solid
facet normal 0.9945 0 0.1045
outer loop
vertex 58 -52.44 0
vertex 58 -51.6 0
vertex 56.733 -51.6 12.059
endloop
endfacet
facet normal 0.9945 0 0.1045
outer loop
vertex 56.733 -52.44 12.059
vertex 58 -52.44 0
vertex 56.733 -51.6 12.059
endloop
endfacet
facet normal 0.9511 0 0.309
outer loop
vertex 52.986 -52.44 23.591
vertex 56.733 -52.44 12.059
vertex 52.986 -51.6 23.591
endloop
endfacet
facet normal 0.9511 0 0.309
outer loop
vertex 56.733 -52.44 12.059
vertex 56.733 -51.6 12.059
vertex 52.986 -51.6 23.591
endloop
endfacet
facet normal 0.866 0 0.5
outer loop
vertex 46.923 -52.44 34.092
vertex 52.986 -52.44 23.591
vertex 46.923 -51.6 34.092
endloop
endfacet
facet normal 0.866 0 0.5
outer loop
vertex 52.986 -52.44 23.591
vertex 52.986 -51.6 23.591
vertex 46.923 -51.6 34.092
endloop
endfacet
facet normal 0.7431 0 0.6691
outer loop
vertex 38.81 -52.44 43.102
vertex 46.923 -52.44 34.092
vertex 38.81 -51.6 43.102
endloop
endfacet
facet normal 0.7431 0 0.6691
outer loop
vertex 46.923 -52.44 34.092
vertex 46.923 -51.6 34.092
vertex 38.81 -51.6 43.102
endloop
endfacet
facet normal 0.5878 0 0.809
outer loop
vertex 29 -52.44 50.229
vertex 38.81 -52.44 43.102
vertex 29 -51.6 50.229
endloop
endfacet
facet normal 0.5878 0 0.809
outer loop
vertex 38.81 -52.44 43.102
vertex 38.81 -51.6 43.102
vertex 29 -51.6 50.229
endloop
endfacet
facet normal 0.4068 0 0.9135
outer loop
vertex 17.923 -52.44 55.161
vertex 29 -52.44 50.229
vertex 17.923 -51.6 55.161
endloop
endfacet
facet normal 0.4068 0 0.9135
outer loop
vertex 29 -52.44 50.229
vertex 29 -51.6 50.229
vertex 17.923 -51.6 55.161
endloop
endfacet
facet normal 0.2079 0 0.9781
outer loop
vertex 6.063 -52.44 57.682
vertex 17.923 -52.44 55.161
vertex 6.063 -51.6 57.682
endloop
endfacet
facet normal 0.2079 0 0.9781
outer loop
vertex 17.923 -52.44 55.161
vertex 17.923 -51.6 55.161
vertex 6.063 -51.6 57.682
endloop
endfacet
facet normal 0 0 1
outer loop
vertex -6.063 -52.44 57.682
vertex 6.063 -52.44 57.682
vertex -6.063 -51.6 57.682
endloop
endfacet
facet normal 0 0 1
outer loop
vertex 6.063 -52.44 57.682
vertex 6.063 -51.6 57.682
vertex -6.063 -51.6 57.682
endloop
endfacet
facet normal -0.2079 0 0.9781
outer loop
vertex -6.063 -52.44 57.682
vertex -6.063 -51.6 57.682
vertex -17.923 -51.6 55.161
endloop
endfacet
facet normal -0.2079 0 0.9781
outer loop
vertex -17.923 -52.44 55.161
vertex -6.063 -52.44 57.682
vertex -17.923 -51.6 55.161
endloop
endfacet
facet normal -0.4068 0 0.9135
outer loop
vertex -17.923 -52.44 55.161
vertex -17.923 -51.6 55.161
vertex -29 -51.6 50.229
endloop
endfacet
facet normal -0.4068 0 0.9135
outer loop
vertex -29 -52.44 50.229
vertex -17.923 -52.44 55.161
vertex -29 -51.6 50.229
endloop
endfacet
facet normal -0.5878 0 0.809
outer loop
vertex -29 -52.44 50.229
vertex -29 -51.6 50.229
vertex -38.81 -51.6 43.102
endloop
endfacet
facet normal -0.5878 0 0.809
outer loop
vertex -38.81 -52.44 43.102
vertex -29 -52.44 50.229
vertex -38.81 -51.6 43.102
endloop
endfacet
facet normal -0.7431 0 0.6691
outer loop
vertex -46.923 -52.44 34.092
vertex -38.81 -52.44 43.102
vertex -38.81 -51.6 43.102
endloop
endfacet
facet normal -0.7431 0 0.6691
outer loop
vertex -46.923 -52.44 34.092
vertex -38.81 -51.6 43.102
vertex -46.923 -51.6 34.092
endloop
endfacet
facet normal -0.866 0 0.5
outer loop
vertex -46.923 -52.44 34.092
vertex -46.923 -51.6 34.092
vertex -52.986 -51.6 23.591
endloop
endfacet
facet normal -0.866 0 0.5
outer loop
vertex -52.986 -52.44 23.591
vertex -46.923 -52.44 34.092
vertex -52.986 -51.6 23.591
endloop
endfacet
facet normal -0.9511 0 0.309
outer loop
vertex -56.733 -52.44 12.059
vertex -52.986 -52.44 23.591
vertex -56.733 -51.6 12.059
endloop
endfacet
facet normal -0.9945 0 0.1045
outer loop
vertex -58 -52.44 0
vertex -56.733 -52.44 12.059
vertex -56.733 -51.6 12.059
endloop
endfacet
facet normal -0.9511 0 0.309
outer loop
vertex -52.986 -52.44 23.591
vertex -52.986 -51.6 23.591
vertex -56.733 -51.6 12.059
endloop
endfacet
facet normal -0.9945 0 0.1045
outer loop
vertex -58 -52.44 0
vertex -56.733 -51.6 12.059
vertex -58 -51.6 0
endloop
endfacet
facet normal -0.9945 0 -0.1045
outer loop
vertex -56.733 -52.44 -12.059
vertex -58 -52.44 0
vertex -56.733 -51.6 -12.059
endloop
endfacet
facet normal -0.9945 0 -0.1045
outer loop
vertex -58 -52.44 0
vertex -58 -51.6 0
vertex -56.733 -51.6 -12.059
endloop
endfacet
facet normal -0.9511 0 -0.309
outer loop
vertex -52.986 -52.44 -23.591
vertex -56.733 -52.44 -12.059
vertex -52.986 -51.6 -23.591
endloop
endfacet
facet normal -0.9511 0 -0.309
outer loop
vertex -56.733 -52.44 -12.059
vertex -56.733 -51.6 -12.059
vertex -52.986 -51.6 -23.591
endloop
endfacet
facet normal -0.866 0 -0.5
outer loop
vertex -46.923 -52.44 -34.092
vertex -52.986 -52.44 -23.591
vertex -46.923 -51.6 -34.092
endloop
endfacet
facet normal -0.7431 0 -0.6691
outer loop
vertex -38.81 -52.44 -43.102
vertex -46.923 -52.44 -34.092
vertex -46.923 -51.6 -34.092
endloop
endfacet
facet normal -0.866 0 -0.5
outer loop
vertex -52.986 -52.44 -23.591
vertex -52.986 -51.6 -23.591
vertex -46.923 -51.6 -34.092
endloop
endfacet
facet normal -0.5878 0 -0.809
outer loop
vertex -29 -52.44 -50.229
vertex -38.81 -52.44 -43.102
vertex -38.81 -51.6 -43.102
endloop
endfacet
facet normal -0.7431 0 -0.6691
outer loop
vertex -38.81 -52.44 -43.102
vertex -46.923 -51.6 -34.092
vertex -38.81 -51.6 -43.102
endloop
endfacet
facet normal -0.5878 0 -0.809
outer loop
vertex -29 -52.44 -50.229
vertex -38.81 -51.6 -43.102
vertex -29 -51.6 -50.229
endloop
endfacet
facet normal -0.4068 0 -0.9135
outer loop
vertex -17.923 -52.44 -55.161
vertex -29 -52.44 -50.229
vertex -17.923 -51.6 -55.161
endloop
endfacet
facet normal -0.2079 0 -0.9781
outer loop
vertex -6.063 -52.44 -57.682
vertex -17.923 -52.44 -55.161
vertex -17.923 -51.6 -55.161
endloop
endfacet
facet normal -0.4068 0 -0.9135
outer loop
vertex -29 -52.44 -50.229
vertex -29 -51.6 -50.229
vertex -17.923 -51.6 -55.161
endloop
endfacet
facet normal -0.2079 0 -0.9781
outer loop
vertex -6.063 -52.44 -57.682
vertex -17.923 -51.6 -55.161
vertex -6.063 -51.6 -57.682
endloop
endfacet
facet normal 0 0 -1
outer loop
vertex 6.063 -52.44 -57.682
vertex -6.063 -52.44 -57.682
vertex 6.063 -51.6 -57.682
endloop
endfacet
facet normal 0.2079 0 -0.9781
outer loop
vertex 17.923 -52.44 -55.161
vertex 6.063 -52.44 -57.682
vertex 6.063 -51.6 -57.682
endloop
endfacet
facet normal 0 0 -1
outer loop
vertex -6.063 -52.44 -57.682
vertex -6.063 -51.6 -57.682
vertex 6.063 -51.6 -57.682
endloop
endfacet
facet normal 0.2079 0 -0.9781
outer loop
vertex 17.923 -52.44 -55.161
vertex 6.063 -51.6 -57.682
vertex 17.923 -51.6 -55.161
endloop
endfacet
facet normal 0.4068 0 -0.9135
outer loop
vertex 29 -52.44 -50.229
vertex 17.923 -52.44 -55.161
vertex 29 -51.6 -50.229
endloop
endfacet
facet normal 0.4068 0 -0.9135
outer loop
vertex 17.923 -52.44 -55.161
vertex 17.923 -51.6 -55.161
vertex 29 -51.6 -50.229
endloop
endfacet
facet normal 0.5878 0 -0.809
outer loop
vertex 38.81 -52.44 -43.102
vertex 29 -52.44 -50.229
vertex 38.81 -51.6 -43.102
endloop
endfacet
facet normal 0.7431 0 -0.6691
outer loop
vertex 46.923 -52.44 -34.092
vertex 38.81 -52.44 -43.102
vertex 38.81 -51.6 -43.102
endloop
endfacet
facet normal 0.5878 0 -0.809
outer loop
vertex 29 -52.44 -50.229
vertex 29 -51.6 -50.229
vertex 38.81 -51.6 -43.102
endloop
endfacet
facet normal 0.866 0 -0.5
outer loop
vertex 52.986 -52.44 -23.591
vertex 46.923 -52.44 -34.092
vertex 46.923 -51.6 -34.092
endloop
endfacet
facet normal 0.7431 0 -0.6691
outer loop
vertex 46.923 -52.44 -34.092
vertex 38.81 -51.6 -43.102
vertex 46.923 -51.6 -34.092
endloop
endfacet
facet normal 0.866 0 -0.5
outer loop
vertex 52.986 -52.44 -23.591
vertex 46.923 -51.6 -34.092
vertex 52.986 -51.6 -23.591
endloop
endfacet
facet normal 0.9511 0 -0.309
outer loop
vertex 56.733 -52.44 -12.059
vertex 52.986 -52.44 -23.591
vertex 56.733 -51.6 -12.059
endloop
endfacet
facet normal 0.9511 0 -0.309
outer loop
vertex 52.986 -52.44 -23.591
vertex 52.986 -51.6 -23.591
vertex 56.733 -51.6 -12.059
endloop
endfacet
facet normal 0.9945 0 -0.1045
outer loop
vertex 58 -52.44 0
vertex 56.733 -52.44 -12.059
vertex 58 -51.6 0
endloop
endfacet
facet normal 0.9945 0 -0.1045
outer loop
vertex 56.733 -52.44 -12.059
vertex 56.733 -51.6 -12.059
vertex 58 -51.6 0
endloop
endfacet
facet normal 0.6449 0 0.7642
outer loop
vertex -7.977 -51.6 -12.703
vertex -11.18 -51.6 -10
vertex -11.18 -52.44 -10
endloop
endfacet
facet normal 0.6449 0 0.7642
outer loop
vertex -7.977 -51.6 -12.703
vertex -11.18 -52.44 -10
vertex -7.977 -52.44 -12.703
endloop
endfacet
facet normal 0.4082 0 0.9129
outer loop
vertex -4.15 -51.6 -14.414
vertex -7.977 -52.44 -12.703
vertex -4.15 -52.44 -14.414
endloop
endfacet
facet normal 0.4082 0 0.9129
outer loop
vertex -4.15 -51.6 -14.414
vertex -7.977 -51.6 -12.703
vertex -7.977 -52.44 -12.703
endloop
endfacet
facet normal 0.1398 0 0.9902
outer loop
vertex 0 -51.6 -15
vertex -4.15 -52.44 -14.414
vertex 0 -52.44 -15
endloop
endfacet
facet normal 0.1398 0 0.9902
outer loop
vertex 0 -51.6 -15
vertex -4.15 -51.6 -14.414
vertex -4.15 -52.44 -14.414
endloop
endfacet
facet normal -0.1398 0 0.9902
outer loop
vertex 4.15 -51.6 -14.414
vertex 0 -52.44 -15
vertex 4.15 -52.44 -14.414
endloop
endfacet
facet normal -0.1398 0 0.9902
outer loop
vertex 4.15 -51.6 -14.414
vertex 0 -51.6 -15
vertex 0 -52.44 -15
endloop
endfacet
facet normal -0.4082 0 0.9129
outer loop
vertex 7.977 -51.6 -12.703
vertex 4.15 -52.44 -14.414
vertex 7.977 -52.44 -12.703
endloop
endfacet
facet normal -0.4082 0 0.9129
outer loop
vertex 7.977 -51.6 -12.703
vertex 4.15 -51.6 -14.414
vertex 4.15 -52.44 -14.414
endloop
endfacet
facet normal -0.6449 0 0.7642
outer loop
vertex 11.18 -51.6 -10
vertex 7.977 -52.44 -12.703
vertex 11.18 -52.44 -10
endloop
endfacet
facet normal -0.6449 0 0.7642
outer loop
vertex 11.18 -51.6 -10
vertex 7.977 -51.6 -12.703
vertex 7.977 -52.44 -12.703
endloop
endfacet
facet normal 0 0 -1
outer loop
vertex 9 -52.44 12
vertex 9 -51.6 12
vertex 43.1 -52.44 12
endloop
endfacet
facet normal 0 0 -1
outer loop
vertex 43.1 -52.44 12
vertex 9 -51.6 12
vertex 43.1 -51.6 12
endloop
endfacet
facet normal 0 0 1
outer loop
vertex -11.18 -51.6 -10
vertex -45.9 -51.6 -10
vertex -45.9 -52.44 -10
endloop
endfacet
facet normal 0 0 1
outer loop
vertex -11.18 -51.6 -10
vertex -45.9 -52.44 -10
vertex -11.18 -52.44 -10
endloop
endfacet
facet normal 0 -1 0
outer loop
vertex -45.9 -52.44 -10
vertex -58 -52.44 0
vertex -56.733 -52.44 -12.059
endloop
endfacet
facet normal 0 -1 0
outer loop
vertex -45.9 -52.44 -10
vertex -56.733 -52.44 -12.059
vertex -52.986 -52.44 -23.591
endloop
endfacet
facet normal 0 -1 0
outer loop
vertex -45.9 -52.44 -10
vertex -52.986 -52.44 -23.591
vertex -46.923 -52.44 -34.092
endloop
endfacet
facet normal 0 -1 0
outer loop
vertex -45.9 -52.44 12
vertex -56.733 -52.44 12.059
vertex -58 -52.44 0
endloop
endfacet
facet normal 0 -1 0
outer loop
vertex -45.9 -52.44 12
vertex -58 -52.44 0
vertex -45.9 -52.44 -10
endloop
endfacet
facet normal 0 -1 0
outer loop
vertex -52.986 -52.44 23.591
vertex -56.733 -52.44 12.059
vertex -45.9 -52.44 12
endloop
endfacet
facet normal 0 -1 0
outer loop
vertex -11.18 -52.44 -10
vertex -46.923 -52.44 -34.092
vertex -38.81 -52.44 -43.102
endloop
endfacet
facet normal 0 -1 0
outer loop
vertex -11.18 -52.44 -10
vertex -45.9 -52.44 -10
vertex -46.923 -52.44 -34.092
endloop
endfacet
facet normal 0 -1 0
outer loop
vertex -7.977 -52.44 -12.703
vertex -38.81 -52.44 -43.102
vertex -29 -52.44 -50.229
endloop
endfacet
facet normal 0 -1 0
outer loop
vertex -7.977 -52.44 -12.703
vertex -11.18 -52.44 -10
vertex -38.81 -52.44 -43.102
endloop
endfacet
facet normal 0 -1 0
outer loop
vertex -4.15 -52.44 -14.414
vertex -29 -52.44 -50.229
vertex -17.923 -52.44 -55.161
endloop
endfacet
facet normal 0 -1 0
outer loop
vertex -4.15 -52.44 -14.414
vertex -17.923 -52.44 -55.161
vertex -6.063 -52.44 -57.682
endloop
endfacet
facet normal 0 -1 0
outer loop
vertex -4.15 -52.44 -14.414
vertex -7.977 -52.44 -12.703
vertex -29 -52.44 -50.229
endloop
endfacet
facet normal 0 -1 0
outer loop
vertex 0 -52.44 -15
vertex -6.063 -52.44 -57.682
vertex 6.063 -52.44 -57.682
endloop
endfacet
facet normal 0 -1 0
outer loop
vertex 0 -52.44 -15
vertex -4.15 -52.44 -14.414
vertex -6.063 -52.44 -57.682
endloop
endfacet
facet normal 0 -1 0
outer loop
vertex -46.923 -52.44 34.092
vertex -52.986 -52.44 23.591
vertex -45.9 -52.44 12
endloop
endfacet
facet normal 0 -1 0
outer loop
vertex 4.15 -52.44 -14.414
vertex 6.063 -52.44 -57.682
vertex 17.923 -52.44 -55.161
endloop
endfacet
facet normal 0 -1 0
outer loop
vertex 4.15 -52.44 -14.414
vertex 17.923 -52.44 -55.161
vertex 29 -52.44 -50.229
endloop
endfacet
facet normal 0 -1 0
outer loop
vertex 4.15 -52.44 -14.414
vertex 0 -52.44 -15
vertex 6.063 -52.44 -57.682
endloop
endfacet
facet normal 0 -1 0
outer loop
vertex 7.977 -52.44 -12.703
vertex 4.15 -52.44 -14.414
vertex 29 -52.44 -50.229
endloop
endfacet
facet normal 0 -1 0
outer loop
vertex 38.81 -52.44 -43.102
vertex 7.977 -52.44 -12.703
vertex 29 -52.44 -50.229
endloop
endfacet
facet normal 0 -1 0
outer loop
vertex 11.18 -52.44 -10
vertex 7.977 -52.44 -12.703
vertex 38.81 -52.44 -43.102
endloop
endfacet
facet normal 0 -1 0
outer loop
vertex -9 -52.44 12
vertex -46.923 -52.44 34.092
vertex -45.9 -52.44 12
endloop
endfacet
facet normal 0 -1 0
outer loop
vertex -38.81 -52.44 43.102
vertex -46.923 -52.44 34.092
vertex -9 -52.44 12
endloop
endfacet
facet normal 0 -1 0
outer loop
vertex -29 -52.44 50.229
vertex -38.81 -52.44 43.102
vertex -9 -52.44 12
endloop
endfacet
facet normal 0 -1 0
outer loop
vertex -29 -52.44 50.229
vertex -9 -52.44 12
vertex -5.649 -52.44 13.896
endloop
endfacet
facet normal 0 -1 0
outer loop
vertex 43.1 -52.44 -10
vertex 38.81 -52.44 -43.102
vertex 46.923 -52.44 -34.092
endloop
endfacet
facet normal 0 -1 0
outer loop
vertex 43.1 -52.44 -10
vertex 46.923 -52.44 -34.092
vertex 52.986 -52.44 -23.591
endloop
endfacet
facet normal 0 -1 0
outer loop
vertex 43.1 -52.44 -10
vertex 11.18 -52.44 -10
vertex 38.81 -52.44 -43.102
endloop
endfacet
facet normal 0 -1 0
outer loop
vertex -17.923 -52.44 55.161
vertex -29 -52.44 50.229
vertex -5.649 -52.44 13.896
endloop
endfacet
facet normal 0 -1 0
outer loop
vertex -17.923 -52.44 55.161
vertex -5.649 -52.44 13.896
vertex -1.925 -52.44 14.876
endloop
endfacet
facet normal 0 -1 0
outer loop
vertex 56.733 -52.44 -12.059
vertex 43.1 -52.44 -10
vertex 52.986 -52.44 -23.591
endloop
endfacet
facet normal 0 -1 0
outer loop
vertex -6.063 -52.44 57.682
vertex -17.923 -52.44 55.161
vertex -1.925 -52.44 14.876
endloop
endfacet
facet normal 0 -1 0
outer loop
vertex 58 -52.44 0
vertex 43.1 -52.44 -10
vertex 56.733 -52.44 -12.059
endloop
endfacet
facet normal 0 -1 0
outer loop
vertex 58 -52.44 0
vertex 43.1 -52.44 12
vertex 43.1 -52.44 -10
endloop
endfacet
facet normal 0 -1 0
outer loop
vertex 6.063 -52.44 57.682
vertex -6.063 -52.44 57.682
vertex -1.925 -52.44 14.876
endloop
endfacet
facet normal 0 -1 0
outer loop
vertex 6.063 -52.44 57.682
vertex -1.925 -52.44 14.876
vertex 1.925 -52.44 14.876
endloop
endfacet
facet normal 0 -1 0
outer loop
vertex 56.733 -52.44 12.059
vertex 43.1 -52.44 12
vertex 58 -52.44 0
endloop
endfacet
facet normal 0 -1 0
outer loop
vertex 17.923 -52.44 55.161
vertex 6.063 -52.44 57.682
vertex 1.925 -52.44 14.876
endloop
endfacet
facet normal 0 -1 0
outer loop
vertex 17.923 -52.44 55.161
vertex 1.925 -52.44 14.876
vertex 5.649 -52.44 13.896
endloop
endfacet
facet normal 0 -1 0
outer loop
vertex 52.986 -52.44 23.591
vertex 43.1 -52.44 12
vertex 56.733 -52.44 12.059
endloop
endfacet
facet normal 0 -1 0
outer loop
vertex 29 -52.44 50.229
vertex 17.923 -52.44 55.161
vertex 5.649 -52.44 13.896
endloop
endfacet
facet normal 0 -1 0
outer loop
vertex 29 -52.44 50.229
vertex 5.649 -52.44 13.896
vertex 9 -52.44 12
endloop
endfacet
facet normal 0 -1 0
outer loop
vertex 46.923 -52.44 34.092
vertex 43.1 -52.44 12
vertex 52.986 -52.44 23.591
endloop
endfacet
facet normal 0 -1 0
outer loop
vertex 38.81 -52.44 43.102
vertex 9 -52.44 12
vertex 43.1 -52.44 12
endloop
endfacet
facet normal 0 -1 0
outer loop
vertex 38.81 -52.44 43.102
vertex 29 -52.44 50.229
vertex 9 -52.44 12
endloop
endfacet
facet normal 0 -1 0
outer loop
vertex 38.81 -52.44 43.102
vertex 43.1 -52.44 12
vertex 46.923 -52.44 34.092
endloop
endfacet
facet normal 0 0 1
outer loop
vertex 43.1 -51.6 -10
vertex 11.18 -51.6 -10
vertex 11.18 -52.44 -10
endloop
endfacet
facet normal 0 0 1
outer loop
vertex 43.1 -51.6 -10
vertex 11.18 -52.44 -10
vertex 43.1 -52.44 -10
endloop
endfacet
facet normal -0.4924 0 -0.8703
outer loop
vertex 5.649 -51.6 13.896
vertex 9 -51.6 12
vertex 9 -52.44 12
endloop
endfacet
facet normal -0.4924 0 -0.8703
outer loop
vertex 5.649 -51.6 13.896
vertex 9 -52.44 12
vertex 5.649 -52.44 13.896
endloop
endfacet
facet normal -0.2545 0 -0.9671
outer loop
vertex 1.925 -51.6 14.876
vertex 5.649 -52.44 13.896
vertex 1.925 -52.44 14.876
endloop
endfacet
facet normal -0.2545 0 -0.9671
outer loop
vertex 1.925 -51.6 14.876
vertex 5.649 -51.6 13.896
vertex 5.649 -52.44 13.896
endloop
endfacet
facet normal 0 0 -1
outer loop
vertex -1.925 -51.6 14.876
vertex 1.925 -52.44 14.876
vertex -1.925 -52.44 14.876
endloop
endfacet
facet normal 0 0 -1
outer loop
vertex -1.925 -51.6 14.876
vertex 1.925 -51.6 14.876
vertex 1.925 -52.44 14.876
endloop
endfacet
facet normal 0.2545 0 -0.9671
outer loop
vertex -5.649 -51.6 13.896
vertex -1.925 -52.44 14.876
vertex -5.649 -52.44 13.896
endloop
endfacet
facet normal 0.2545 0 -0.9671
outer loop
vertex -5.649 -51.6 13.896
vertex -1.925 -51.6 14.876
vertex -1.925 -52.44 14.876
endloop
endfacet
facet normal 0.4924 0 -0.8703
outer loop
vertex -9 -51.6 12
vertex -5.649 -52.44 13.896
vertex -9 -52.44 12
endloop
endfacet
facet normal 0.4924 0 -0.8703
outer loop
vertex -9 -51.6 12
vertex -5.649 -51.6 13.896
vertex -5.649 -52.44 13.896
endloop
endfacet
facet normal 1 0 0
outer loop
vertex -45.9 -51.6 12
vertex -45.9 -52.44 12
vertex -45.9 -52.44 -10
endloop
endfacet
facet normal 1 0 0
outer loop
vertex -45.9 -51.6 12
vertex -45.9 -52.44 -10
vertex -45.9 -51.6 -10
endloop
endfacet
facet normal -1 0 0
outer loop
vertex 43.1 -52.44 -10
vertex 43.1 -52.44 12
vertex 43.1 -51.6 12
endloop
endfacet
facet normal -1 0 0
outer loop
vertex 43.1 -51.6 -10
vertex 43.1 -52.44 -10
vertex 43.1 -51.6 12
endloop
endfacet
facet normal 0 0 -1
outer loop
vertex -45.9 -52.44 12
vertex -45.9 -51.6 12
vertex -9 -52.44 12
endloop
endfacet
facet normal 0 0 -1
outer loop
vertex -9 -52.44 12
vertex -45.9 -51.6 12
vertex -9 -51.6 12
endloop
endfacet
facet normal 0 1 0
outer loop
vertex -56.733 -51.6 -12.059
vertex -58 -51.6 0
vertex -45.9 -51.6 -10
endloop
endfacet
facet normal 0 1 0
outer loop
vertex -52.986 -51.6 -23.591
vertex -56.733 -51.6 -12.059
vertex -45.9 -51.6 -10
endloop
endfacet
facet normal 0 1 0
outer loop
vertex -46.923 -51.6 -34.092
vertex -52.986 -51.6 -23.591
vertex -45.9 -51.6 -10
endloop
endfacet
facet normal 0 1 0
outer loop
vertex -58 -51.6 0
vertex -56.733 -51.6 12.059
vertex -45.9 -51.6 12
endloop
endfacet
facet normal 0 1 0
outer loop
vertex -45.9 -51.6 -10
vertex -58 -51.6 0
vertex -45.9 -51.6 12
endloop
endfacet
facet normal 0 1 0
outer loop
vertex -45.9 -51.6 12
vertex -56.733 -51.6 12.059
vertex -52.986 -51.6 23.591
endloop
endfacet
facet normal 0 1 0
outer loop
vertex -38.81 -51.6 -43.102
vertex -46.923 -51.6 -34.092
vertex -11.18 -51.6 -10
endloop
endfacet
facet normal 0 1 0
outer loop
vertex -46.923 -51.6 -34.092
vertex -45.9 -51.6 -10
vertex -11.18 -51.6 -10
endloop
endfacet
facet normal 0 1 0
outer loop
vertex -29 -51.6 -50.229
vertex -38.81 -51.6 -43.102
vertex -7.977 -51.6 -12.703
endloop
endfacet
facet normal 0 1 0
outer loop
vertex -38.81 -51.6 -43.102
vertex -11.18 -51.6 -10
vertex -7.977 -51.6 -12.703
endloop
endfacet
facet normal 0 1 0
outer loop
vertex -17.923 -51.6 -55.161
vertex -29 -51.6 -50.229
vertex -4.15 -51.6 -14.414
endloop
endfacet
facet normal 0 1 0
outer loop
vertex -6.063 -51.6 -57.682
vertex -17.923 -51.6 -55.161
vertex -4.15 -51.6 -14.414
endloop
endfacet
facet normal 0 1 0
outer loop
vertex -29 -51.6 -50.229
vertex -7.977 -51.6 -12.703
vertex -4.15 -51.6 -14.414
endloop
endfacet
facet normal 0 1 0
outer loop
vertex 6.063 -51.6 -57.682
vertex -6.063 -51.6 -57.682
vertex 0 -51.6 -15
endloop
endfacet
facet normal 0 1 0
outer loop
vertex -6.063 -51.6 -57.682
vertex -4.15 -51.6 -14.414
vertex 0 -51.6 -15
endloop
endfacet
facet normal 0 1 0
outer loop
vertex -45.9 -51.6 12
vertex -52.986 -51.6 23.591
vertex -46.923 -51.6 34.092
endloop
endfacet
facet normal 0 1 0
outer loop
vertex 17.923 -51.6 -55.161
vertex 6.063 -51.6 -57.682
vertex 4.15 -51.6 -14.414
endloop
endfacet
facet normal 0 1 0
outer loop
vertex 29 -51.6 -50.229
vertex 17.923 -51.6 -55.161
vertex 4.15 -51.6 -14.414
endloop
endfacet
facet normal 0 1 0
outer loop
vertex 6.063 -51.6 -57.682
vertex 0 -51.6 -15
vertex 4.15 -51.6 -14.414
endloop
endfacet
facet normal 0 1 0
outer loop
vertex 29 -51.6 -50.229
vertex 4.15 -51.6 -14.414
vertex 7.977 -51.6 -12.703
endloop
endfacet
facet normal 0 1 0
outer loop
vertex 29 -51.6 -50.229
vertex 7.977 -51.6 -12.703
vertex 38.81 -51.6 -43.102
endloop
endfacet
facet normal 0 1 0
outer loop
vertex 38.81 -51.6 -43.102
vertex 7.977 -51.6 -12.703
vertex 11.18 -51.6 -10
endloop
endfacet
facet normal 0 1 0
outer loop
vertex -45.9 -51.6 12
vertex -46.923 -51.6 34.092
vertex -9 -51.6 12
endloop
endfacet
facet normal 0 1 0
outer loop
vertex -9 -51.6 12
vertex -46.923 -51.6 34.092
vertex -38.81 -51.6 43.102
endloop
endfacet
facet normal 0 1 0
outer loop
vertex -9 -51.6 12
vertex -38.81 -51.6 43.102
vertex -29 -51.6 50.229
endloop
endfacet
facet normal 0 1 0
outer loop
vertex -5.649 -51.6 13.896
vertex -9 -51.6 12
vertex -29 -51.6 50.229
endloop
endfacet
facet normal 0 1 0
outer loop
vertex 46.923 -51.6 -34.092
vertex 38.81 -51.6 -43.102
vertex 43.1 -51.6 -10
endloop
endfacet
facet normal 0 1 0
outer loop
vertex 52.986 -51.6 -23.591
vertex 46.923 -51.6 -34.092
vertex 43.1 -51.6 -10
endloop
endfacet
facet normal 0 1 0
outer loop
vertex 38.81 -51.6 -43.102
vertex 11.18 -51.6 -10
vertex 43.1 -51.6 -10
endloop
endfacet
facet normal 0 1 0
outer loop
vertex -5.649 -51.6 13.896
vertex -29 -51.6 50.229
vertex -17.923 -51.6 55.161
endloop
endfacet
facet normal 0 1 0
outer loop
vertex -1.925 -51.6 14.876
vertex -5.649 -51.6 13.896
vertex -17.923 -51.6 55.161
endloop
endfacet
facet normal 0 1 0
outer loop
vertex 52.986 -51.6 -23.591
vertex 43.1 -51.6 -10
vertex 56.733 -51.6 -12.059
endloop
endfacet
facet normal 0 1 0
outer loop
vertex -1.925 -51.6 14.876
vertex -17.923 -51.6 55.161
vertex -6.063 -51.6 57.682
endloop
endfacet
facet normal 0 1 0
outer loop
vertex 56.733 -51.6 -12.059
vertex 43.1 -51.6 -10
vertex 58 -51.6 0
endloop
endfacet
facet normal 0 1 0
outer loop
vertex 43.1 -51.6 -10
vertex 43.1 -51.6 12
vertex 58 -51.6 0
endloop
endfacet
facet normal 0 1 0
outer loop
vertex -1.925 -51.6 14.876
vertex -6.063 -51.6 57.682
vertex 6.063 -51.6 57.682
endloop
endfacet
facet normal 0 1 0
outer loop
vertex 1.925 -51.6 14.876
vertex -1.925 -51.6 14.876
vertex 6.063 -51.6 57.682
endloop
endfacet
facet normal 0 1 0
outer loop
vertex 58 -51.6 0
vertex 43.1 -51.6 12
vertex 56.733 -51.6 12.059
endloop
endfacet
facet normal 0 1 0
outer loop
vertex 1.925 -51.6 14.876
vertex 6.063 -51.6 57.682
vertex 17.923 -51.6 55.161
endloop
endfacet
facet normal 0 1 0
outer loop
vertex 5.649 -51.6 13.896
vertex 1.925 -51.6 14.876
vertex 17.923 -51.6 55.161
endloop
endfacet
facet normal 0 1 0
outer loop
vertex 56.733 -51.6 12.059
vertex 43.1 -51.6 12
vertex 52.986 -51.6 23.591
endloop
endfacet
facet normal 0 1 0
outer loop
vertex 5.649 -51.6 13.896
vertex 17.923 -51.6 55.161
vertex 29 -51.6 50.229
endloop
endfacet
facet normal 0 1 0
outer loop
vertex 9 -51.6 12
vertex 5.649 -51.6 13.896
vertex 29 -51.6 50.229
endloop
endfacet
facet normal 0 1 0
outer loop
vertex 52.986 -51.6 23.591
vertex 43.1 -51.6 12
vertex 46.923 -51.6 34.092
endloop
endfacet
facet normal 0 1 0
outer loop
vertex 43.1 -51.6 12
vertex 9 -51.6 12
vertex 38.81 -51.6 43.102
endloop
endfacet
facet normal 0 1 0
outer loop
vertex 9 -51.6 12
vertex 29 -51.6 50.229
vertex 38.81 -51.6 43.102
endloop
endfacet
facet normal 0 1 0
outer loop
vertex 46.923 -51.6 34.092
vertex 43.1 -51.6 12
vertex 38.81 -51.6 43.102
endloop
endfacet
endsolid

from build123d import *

# Parameters (mm, degrees)
CYLINDER005_R     = 15
CYLINDER005_DEPTH = 17.84
BOX_W             = 89
BOX_H             = 17
BOX_DEPTH         = 22
CYLINDER004_R     = 58
CYLINDER004_DEPTH = 0.84


with BuildPart() as cylinder005:
    # Cylinder005 → Cylinder005 (new body)
    with BuildSketch(Plane.XZ.offset(42.6)):
        Circle(CYLINDER005_R)
    extrude(amount=CYLINDER005_DEPTH)


with BuildPart() as cube:
    # Box → Box (new body)
    with BuildSketch(Plane(origin=(-45.9, -59.6, -10), x_dir=(1, 0, 0), z_dir=(0, 0, 1))):
        with Locations((44.5, 8.5)):
            Rectangle(BOX_W, BOX_H)
    extrude(amount=BOX_DEPTH)


with BuildPart() as base:
    # Cylinder004 → Cylinder004 (new body)
    with BuildSketch(Plane.XZ.offset(49.6)):
        Circle(CYLINDER004_R)
    extrude(amount=CYLINDER004_DEPTH)

    # Cut002: cut Cube
    add(cube.part, mode=Mode.SUBTRACT)

    # Cut003: cut Cylinder005
    add(cylinder005.part, mode=Mode.SUBTRACT)


with BuildPart() as base_1:
    # Cut003 placement: moved
    add(base.part.moved(Location((0, -2, 0))))


solid = base_1.part
